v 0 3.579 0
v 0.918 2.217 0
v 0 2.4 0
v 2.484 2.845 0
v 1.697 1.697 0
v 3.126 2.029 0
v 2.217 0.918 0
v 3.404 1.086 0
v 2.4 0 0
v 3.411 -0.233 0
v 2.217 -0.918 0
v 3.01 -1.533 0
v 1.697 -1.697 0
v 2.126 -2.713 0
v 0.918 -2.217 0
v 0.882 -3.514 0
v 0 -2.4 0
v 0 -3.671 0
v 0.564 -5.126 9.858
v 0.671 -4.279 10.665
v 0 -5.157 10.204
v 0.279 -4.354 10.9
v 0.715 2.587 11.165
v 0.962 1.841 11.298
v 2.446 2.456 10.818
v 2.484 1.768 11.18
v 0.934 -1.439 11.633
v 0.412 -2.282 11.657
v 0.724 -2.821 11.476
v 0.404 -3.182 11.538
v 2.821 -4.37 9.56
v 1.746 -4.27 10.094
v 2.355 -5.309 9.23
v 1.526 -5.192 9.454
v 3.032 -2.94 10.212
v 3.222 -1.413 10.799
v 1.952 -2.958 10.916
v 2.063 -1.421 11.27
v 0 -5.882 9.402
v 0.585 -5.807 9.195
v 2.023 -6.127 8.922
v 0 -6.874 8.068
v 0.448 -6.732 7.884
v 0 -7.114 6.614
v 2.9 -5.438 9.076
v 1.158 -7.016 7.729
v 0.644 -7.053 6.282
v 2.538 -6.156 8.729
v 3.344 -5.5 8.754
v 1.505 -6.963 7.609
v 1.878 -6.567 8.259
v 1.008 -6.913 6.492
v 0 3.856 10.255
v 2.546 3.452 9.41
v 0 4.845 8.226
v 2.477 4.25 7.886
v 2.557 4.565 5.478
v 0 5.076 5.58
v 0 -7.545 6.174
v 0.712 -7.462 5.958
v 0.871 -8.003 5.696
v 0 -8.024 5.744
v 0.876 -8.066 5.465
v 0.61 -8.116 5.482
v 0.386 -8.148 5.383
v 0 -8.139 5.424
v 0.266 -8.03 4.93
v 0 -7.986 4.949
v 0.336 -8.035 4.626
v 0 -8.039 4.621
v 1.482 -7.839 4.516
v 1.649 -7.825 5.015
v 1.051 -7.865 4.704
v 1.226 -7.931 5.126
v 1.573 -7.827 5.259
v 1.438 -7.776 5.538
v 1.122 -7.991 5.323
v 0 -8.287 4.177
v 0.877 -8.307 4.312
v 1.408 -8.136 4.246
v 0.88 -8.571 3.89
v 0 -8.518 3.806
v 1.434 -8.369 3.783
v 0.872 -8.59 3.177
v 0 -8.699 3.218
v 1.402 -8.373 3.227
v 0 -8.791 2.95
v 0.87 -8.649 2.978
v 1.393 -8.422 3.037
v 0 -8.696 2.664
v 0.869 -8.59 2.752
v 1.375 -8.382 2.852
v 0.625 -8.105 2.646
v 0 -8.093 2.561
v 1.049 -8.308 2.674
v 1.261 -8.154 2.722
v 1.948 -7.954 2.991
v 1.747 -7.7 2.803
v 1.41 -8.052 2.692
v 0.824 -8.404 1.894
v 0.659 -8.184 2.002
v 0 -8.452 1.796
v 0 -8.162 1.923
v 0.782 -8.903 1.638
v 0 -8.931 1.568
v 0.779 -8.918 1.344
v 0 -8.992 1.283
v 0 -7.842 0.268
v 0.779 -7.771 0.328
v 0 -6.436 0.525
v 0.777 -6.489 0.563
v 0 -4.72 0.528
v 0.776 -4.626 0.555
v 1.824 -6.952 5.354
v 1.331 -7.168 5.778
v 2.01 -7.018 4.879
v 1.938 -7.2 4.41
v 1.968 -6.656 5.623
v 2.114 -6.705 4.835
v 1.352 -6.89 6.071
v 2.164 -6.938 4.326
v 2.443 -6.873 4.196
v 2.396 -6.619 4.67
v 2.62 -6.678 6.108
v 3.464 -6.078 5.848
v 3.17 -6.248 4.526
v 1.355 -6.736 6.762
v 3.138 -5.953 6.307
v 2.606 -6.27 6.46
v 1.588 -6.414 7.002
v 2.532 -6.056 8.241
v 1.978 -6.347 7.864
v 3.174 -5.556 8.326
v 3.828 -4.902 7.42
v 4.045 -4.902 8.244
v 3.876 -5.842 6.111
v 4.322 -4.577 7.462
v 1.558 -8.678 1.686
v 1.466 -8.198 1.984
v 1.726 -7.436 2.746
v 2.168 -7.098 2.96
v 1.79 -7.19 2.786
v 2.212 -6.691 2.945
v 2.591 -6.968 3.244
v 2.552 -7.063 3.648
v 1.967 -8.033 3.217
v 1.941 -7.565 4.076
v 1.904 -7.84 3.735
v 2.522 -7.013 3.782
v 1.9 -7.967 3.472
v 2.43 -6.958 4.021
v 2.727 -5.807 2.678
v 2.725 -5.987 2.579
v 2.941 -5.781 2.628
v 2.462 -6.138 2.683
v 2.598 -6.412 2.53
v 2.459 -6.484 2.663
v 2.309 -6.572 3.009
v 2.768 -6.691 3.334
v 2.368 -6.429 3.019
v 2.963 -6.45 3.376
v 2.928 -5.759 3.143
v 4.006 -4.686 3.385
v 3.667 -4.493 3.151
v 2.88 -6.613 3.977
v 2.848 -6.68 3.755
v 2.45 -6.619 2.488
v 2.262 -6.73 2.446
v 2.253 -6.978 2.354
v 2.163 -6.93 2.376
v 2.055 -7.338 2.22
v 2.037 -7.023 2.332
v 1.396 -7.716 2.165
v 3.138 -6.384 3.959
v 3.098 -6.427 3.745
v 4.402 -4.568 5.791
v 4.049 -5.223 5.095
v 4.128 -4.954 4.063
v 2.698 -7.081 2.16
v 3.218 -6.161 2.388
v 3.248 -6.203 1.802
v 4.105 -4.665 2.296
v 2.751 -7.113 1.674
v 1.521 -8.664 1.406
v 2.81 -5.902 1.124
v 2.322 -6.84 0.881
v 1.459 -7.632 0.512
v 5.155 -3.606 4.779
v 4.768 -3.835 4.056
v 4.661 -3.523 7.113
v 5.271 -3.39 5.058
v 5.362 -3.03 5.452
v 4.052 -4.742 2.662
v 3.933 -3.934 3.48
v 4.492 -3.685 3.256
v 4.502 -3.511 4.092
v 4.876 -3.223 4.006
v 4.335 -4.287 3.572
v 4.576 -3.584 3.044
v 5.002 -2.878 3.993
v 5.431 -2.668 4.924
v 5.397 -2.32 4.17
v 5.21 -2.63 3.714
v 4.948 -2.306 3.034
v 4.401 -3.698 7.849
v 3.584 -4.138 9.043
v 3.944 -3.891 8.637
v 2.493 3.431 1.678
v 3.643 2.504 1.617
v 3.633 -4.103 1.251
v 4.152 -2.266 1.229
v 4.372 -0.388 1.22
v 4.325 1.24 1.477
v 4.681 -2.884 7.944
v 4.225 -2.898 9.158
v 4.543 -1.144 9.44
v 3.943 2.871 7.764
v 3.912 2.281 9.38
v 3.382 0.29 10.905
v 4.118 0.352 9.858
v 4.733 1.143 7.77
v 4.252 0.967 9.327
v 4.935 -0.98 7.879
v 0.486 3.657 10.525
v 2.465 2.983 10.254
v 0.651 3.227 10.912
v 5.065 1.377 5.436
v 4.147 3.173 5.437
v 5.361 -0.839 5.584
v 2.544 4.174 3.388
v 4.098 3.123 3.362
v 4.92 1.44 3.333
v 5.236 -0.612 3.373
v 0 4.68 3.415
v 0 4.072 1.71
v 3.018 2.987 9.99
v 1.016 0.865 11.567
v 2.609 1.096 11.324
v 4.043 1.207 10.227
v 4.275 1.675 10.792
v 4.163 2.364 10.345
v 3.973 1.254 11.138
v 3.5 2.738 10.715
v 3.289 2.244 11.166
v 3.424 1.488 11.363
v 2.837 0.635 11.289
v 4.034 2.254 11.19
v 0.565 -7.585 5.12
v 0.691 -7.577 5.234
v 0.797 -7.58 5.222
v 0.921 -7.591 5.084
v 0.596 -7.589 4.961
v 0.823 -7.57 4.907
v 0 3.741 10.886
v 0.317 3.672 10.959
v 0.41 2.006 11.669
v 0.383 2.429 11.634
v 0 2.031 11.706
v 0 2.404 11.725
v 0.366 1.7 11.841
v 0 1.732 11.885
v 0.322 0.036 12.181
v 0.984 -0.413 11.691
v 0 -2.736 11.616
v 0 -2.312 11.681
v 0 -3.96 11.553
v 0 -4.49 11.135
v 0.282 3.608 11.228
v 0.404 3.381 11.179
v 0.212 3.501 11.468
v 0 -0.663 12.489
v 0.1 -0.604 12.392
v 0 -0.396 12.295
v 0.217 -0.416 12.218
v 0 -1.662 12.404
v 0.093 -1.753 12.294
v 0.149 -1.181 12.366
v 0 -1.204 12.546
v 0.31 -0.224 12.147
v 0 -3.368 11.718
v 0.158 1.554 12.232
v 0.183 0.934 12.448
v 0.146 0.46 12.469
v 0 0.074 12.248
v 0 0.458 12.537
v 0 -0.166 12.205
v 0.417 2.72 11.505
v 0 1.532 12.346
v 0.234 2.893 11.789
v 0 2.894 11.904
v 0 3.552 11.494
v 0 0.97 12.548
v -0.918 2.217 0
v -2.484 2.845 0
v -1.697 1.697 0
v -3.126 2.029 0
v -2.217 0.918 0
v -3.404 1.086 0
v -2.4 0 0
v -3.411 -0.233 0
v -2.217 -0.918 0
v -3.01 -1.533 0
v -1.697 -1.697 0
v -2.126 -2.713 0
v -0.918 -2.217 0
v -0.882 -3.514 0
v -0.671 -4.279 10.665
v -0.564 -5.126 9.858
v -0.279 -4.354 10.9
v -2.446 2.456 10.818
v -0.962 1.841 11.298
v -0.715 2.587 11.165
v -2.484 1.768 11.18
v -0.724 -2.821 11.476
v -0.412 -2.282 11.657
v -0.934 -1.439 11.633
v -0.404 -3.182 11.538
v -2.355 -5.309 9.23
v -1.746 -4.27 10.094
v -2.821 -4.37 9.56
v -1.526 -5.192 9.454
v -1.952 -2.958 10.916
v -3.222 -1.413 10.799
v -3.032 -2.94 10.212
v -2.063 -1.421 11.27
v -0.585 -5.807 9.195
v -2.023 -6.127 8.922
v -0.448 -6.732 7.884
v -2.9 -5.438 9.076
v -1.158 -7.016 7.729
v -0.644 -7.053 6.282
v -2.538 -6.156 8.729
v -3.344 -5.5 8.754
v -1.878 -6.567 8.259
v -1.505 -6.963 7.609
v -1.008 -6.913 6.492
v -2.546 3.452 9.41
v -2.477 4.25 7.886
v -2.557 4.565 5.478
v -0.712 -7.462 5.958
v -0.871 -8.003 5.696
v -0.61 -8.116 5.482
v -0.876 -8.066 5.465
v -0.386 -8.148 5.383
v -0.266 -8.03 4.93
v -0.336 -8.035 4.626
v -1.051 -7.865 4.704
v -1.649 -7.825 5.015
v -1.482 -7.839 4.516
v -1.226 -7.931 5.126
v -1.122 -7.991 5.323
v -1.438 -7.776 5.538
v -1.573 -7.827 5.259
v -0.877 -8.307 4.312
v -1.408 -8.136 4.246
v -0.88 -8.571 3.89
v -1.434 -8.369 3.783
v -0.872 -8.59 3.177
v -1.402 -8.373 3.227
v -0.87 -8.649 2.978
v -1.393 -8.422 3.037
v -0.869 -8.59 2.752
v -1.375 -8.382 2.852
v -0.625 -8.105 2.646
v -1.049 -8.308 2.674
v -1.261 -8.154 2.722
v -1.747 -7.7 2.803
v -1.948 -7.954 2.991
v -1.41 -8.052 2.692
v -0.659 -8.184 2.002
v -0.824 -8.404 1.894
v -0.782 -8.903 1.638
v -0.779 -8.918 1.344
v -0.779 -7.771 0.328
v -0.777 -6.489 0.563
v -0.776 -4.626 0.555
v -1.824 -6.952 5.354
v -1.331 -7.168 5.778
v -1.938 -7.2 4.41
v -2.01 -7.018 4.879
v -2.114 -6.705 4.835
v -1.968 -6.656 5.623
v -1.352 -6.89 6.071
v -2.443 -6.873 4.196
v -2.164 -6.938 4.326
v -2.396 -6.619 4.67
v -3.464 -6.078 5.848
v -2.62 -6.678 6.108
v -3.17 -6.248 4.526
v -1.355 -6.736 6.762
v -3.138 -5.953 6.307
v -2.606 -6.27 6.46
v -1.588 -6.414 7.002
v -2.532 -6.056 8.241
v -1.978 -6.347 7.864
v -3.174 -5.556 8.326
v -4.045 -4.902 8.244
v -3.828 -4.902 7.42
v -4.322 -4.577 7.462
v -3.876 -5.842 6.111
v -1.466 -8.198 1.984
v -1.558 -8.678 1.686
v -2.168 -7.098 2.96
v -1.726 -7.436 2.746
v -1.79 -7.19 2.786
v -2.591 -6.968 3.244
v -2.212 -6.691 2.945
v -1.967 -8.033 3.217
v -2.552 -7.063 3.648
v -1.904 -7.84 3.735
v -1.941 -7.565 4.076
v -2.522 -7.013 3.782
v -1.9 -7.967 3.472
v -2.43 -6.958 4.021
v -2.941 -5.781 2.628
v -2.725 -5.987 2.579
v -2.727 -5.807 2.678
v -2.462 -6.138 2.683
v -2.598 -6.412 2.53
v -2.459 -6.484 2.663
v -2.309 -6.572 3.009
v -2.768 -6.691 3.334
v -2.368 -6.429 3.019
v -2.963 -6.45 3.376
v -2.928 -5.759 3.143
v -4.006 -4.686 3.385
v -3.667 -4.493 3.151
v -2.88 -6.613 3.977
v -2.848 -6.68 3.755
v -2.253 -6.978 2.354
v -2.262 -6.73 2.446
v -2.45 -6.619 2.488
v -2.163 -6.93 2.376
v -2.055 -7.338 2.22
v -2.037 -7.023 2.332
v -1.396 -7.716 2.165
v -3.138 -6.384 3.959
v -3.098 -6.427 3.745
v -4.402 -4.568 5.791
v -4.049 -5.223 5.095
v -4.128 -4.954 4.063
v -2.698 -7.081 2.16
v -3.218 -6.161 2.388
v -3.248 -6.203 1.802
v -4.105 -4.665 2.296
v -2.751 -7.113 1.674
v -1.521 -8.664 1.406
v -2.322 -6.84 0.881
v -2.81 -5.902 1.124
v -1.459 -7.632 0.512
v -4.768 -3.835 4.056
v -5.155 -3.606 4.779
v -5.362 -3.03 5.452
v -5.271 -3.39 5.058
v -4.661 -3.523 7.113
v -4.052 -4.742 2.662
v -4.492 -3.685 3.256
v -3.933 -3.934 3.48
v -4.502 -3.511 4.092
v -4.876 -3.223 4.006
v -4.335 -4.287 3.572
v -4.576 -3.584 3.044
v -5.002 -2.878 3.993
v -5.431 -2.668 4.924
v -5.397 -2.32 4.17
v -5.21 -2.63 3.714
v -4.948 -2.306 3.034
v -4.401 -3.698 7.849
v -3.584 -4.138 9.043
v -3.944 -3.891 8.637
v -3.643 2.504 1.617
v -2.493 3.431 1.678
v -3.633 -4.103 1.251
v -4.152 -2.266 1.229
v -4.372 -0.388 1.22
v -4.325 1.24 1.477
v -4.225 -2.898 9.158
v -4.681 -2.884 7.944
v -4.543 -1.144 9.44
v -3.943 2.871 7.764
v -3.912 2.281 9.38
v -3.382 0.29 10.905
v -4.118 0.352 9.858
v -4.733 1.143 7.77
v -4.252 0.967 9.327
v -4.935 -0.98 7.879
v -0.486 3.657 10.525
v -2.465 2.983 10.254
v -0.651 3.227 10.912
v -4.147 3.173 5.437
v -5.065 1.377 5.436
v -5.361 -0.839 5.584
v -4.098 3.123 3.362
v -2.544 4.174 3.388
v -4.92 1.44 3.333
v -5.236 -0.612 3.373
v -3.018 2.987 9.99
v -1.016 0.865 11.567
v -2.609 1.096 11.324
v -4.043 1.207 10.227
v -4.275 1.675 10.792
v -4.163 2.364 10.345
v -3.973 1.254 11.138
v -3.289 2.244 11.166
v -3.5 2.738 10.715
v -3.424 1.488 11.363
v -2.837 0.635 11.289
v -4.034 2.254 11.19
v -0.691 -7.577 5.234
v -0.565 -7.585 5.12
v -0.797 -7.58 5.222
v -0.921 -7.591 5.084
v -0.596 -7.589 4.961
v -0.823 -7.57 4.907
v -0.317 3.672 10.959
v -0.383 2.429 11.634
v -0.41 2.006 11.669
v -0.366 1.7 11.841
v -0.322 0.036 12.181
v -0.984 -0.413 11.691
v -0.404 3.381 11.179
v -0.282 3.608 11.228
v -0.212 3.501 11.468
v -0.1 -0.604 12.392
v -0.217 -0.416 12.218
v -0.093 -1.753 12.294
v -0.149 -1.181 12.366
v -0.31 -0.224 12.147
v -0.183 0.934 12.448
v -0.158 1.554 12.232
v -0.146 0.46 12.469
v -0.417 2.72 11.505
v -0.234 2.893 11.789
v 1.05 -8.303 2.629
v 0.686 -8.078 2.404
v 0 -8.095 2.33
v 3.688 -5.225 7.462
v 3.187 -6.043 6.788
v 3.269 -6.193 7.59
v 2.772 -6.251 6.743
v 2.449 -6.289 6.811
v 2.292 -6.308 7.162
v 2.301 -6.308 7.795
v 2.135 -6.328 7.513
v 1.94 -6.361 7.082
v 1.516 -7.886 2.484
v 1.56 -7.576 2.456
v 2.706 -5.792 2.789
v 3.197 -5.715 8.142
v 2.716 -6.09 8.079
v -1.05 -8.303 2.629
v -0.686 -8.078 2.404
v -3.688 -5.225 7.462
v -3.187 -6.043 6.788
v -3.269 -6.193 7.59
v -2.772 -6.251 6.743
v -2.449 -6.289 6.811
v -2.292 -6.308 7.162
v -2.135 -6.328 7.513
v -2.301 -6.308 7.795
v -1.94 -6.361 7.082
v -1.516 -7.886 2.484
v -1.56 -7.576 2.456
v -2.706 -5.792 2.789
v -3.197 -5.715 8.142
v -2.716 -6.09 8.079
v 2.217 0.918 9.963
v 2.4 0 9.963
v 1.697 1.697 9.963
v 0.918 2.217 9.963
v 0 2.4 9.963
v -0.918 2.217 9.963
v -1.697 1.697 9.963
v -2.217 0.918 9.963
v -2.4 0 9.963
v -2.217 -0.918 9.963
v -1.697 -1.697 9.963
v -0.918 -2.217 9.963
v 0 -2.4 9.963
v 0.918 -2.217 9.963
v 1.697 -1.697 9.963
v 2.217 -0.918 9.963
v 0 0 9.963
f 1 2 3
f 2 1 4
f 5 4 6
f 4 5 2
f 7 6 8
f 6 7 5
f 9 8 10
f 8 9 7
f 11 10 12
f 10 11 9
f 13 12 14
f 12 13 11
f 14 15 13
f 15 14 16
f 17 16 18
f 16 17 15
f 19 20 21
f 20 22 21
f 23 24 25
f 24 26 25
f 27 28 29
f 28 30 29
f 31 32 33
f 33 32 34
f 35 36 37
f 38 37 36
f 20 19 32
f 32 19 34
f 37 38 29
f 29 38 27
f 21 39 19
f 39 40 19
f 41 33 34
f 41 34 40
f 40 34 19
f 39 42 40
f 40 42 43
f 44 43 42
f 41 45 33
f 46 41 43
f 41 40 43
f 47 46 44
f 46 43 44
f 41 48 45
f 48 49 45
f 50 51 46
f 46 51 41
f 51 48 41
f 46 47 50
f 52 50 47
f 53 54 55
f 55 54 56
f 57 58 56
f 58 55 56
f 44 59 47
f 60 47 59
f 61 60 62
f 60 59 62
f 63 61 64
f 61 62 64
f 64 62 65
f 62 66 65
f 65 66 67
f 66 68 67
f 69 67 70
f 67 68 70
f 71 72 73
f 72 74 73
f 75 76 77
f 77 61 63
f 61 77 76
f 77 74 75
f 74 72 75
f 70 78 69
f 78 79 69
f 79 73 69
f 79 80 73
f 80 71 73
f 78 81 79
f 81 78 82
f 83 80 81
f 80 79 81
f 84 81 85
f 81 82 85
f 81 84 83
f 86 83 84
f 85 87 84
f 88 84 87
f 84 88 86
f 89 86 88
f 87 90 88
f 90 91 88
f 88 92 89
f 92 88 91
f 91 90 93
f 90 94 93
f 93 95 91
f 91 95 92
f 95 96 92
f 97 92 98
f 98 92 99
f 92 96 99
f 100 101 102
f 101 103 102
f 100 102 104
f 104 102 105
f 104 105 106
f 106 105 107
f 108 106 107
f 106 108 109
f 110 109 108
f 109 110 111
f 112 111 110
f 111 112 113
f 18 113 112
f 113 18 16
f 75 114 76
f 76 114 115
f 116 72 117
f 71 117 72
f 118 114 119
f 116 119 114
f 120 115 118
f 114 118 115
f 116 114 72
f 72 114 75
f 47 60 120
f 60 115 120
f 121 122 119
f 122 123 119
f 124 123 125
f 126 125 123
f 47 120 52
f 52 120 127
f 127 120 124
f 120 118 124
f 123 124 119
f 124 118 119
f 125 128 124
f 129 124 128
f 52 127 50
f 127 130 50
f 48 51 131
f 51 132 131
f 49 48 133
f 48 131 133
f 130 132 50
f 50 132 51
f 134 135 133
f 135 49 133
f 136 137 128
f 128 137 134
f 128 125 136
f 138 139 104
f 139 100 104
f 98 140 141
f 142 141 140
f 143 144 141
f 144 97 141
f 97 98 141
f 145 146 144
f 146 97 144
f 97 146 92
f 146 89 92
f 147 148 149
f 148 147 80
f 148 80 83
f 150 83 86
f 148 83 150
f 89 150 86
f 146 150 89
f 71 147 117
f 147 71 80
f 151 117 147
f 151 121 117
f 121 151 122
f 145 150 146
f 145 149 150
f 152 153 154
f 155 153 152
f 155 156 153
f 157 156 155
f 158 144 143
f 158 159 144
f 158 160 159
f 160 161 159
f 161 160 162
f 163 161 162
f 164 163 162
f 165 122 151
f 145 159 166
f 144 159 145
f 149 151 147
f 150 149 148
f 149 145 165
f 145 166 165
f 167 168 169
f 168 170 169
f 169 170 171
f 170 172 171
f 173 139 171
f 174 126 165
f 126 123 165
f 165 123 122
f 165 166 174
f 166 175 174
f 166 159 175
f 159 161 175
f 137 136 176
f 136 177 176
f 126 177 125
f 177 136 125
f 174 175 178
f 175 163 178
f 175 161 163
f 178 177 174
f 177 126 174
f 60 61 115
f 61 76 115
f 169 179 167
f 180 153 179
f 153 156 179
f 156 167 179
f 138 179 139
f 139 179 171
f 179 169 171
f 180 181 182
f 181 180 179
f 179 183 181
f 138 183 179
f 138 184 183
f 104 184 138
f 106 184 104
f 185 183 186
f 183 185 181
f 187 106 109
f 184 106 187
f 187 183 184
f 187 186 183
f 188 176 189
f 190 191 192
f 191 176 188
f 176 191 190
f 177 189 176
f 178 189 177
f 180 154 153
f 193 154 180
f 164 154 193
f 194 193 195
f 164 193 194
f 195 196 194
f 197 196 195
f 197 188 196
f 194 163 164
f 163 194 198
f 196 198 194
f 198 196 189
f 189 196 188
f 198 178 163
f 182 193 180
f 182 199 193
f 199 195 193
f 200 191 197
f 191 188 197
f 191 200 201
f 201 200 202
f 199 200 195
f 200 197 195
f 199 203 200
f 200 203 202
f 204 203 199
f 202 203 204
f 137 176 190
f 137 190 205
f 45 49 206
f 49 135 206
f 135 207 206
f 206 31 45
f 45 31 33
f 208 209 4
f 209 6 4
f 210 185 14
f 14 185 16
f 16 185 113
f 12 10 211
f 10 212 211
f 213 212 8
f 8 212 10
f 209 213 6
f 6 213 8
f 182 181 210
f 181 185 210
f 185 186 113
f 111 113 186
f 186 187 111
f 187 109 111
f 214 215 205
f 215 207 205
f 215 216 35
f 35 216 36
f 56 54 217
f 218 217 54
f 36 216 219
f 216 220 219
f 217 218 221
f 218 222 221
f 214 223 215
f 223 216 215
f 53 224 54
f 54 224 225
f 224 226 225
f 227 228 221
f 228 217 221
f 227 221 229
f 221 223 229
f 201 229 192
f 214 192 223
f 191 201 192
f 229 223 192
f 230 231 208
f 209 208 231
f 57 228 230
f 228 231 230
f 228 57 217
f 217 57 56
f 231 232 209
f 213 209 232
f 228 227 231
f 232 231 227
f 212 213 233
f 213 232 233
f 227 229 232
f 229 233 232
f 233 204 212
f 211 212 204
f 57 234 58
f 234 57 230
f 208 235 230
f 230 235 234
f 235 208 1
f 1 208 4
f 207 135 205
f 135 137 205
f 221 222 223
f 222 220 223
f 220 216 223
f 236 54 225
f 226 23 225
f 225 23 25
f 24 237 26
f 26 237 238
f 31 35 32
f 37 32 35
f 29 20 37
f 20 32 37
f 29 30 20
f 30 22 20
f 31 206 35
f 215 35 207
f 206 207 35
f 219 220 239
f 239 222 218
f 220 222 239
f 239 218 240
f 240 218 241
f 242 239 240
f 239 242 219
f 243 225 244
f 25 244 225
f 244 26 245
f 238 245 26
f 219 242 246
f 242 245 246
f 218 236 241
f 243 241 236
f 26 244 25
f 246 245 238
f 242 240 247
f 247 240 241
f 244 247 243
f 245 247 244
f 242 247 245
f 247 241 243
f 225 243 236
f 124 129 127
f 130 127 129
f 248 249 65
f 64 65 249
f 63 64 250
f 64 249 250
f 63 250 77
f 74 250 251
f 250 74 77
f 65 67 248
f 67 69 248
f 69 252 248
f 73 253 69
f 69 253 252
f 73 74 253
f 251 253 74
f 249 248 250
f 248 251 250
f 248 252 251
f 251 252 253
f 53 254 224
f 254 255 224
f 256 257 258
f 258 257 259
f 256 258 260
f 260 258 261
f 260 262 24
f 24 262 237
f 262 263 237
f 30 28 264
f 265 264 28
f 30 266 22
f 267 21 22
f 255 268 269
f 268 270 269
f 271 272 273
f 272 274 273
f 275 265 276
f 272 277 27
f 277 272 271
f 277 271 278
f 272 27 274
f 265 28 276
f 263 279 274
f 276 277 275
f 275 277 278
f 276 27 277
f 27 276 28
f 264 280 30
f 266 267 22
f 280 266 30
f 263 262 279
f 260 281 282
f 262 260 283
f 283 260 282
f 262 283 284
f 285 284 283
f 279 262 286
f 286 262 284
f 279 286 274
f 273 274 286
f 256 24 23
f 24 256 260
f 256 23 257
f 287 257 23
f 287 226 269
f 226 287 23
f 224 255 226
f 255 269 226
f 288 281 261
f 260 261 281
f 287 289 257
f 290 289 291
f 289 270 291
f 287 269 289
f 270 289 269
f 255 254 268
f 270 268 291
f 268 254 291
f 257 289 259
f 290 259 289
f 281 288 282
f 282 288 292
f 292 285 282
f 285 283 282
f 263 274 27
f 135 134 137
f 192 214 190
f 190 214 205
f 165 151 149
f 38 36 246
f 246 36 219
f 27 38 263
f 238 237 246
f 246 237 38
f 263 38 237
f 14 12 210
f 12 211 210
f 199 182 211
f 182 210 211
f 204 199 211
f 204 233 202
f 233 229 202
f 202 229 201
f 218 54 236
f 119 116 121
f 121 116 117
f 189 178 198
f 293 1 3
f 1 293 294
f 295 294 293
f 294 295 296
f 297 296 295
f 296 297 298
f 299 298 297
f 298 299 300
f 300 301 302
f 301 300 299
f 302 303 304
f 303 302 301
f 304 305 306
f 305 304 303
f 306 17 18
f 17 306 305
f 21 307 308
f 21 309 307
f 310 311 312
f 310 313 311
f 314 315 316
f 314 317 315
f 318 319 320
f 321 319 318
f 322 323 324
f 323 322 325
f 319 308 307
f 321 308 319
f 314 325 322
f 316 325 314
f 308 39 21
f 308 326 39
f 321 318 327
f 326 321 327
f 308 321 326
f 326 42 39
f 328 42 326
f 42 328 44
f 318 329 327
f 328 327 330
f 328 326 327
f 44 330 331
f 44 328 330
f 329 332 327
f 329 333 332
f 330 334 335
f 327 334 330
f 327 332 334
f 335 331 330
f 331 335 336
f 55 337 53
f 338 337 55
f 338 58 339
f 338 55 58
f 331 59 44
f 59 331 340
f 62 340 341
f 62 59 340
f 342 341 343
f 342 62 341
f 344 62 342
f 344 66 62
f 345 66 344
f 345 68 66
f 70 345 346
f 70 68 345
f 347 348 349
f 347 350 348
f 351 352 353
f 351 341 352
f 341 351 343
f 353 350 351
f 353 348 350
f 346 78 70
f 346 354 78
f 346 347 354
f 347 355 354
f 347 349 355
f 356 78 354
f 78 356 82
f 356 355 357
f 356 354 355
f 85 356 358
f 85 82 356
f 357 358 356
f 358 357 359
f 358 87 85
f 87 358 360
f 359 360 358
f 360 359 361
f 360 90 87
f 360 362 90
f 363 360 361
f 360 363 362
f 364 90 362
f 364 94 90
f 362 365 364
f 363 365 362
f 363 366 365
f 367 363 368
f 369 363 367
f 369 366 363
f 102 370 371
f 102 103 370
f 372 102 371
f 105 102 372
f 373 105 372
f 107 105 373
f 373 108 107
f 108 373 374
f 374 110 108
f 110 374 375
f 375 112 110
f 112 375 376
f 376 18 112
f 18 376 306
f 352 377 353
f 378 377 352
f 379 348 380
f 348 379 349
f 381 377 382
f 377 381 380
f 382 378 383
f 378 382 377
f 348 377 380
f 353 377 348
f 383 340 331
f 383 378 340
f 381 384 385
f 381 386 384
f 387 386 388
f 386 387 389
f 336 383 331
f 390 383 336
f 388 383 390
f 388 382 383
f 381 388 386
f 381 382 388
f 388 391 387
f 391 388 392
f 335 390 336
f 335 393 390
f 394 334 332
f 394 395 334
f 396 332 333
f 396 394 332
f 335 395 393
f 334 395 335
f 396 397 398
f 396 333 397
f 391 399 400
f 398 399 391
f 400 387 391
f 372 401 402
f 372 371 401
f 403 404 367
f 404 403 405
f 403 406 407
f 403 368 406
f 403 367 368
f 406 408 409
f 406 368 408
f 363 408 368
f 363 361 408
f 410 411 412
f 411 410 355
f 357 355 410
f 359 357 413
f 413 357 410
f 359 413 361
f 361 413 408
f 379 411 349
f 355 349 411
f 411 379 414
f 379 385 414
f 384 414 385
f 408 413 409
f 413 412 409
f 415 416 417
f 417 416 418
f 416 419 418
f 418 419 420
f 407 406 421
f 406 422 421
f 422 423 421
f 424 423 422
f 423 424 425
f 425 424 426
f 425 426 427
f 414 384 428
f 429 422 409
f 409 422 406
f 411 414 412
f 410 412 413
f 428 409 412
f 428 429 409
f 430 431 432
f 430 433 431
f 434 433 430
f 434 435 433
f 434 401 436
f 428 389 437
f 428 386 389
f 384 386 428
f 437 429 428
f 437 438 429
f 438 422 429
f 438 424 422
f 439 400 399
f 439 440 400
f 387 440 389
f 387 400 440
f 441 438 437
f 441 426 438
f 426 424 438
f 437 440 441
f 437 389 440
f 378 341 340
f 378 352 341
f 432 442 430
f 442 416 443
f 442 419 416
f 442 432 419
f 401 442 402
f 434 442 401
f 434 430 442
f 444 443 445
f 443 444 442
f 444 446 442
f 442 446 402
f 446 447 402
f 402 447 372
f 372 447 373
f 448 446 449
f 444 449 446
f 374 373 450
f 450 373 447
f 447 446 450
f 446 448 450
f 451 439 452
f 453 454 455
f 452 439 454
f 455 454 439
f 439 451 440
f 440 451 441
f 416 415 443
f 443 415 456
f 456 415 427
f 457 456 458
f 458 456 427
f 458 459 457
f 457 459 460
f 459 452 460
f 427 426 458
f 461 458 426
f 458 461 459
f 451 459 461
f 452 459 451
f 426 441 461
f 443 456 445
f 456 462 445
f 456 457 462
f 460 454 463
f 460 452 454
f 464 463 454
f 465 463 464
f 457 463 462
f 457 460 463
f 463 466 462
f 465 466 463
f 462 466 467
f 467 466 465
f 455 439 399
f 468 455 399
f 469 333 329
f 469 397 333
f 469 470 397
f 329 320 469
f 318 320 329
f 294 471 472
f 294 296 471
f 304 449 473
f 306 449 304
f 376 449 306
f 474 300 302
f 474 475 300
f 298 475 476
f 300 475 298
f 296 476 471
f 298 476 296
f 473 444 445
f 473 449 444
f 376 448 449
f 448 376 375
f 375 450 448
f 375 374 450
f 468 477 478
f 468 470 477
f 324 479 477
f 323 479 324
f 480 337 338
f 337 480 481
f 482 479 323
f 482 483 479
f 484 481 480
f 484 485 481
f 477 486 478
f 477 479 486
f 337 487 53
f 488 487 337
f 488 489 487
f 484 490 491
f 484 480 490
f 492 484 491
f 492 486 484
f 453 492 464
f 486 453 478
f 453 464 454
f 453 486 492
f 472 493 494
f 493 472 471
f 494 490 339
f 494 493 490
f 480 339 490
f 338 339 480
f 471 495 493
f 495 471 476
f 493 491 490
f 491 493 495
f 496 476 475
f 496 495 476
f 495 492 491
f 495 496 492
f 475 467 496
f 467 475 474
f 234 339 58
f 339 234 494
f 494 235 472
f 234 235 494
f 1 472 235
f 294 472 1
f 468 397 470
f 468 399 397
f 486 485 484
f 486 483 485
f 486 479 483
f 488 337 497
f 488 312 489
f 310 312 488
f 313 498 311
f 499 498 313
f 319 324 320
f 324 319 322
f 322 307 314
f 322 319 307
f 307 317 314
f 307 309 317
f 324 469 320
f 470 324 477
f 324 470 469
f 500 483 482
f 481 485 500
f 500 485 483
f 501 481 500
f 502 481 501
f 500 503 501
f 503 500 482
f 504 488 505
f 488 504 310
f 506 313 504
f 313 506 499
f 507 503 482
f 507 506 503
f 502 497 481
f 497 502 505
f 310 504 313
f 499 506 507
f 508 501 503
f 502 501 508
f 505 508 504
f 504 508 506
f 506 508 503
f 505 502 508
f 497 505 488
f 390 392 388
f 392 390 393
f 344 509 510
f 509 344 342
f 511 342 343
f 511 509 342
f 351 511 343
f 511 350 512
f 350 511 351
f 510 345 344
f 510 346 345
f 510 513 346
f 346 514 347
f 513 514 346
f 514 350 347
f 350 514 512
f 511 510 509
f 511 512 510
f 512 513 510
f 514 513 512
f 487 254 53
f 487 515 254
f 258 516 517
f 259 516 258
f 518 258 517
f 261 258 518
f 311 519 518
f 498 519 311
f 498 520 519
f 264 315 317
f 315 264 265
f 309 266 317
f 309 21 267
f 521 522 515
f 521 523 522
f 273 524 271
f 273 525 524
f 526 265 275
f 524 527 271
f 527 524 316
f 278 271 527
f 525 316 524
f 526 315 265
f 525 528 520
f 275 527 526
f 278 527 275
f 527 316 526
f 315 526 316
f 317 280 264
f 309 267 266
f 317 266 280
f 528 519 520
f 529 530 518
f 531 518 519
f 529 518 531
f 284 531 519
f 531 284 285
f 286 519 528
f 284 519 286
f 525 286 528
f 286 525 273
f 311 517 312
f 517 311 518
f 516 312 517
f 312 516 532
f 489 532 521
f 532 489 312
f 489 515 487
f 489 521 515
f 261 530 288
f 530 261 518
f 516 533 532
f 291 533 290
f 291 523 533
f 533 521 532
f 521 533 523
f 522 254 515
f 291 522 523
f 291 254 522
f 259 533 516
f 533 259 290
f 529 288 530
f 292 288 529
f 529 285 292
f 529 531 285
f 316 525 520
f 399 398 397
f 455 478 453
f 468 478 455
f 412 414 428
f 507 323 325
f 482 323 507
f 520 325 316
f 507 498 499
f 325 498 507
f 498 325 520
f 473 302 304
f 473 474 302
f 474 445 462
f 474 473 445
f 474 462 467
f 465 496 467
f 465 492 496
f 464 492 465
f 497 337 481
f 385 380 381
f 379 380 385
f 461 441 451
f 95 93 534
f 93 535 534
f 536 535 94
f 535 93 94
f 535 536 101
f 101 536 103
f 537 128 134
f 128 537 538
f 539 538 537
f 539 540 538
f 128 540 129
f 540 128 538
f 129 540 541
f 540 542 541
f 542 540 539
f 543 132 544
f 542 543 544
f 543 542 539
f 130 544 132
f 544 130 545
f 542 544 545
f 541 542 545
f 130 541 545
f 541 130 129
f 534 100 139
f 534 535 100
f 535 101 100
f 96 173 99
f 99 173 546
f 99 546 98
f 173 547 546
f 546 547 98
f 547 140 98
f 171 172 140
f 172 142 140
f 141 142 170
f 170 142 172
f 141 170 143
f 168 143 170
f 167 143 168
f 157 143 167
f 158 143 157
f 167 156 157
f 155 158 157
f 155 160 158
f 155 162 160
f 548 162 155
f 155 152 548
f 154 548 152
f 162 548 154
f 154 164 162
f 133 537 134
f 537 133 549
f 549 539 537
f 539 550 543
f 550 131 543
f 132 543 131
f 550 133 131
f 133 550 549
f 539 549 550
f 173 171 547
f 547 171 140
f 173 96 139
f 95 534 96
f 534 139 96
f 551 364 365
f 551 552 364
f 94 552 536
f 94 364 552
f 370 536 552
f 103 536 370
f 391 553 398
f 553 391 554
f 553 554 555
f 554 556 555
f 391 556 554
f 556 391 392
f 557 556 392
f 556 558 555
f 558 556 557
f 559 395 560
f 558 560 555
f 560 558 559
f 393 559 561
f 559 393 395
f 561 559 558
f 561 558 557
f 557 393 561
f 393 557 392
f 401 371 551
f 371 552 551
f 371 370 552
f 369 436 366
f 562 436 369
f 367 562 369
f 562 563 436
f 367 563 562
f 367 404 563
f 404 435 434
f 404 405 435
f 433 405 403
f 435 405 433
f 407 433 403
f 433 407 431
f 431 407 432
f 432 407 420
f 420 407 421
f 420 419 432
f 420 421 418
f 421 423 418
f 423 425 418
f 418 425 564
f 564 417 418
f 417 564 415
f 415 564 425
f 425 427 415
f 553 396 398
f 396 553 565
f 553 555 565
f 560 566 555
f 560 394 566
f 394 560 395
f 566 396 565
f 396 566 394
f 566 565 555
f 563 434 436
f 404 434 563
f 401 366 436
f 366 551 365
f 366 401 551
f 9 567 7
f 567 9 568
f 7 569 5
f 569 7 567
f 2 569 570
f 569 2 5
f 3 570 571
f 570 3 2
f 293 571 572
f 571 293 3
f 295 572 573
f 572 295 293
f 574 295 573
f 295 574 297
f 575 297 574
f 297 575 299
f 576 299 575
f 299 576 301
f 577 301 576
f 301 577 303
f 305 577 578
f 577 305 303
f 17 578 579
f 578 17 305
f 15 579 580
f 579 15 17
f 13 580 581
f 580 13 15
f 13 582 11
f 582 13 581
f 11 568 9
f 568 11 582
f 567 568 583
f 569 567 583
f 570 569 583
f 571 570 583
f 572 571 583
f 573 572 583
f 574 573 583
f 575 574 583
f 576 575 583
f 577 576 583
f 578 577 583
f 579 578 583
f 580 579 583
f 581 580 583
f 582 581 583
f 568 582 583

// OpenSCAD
use <../lib.scad>
use <../p/4-4cyli.scad>
use <../p/4-4disc.scad>
use <../p/4-4edge.scad>
use <s/87570p01s01.scad>
use <s/87570s01.scad>
function ldraw_lib__87570p01() = [
// 0 Minifig Head Trandoshan with White Teeth and Orange Eyes with Black Pupil Pattern
// 0 Name: 87570p01.dat
// 0 Author: Gerald Lasser [GeraldLasser]
// 0 !LDRAW_ORG Part UPDATE 2020-03
// 0 !LICENSE Licensed under CC BY 2.0 and CC BY 4.0 : see CAreadme.txt
// 
// 0 BFC CERTIFY CCW
  [0,"BFC","CERTIFY"],
  [0,"BFC","CCW"],
// 
// 0 !KEYWORDS Boosk, Bricklink 87570pb01, Set 10221, Set 8097, Star Wars
// 
// 0 !HISTORY 2020-12-29 [PTadmin] Official Update 2020-03
// 
// 
// 1 16 0 0 0 1 0 0 0 1 0 0 0 1 s\87570s01.dat
  [1,16,0,0,0,1,0,0,0,1,0,0,0,1, ldraw_lib__s__87570s01()],
// 1 16 0 0 0 -1 0 0 0 1 0 0 0 1 s\87570s01.dat
  [1,16,0,0,0,-1,0,0,0,1,0,0,0,1, ldraw_lib__s__87570s01()],
// 1 16 0 0 0 1 0 0 0 1 0 0 0 1 s\87570p01s01.dat
  [1,16,0,0,0,1,0,0,0,1,0,0,0,1, ldraw_lib__s__87570p01s01()],
// 1 16 0 0 0 -1 0 0 0 1 0 0 0 1 s\87570p01s01.dat
  [1,16,0,0,0,-1,0,0,0,1,0,0,0,1, ldraw_lib__s__87570p01s01()],
// 
// 0 BFC INVERTNEXT
  [0,"BFC","INVERTNEXT"],
// 1 16 0 -24.908 0 6 0 0 0 24.908 0 0 0 6 4-4cyli.dat
  [1,16,0,-24.908,0,6,0,0,0,24.908,0,0,0,6, ldraw_lib__4_4cyli()],
// 1 16 0 -24.908 0 6 0 0 0 -1 0 0 0 6 4-4disc.dat
  [1,16,0,-24.908,0,6,0,0,0,-1,0,0,0,6, ldraw_lib__4_4disc()],
// 1 16 0 -24.908 0 6 0 0 0 1 0 0 0 6 4-4edge.dat
  [1,16,0,-24.908,0,6,0,0,0,1,0,0,0,6, ldraw_lib__4_4edge()],
// 1 16 0 0 0 6 0 0 0 1 0 0 0 6 4-4edge.dat
  [1,16,0,0,0,6,0,0,0,1,0,0,0,6, ldraw_lib__4_4edge()],
];
makepoly(ldraw_lib__87570p01(), line=0.2);
